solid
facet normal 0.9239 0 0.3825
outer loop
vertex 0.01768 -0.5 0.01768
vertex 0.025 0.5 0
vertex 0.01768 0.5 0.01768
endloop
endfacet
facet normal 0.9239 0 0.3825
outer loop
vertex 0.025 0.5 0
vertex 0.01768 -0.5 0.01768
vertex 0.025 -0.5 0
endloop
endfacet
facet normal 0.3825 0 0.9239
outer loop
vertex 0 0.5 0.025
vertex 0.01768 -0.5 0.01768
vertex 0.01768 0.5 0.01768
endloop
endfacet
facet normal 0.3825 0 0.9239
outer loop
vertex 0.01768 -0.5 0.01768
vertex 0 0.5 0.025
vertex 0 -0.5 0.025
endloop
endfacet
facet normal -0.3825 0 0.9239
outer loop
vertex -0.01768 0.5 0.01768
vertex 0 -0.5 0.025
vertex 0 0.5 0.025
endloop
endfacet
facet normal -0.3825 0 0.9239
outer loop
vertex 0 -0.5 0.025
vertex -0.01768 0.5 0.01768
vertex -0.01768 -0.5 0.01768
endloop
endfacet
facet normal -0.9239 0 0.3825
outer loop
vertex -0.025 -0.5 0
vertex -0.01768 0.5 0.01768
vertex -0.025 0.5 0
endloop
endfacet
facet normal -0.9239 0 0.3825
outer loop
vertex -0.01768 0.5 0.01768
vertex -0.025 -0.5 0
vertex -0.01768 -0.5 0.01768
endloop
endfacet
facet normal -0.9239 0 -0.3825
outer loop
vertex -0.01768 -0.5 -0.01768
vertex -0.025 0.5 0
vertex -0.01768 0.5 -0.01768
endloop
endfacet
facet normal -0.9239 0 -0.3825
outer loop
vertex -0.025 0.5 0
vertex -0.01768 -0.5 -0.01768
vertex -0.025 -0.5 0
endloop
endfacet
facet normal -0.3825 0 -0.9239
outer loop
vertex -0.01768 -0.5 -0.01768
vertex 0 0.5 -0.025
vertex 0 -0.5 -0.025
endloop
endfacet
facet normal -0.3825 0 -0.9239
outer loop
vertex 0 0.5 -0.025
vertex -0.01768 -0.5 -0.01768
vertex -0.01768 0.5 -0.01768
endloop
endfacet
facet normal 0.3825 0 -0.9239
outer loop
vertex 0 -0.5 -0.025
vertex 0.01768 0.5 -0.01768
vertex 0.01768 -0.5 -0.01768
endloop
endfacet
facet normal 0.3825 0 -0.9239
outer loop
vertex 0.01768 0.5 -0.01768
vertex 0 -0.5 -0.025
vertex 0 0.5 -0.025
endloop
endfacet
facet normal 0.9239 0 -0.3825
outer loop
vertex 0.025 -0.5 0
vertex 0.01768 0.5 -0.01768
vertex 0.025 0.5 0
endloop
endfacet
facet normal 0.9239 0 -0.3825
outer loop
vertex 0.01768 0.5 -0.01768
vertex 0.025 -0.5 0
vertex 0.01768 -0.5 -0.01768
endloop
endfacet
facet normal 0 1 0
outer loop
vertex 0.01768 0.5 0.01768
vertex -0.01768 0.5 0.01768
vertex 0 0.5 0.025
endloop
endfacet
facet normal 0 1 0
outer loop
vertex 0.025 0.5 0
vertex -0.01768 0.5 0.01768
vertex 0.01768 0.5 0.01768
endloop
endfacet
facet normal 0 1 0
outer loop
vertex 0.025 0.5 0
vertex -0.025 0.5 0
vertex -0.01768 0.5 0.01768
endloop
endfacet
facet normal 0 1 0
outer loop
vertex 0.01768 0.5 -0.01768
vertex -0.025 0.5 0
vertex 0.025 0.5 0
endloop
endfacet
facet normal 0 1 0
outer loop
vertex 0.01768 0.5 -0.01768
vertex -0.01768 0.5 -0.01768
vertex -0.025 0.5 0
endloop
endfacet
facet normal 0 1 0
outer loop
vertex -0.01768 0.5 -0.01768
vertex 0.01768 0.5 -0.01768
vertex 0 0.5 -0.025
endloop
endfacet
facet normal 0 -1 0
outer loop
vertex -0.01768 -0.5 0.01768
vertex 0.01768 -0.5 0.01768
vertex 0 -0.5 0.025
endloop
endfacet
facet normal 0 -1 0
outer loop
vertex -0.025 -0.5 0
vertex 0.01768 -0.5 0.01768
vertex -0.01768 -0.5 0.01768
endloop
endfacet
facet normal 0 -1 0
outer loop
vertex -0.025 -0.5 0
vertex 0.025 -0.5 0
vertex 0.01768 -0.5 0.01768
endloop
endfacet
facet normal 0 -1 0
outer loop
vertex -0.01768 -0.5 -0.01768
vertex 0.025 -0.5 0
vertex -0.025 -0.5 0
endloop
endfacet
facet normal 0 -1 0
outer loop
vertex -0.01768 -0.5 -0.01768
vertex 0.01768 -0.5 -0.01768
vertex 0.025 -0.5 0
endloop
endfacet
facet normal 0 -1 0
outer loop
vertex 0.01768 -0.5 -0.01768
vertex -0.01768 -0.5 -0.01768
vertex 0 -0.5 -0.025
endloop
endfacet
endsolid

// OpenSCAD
use <lib.scad>

rotate([90,0,0]) cyl(0.025, 0.025, 1.0, $fn=8);
